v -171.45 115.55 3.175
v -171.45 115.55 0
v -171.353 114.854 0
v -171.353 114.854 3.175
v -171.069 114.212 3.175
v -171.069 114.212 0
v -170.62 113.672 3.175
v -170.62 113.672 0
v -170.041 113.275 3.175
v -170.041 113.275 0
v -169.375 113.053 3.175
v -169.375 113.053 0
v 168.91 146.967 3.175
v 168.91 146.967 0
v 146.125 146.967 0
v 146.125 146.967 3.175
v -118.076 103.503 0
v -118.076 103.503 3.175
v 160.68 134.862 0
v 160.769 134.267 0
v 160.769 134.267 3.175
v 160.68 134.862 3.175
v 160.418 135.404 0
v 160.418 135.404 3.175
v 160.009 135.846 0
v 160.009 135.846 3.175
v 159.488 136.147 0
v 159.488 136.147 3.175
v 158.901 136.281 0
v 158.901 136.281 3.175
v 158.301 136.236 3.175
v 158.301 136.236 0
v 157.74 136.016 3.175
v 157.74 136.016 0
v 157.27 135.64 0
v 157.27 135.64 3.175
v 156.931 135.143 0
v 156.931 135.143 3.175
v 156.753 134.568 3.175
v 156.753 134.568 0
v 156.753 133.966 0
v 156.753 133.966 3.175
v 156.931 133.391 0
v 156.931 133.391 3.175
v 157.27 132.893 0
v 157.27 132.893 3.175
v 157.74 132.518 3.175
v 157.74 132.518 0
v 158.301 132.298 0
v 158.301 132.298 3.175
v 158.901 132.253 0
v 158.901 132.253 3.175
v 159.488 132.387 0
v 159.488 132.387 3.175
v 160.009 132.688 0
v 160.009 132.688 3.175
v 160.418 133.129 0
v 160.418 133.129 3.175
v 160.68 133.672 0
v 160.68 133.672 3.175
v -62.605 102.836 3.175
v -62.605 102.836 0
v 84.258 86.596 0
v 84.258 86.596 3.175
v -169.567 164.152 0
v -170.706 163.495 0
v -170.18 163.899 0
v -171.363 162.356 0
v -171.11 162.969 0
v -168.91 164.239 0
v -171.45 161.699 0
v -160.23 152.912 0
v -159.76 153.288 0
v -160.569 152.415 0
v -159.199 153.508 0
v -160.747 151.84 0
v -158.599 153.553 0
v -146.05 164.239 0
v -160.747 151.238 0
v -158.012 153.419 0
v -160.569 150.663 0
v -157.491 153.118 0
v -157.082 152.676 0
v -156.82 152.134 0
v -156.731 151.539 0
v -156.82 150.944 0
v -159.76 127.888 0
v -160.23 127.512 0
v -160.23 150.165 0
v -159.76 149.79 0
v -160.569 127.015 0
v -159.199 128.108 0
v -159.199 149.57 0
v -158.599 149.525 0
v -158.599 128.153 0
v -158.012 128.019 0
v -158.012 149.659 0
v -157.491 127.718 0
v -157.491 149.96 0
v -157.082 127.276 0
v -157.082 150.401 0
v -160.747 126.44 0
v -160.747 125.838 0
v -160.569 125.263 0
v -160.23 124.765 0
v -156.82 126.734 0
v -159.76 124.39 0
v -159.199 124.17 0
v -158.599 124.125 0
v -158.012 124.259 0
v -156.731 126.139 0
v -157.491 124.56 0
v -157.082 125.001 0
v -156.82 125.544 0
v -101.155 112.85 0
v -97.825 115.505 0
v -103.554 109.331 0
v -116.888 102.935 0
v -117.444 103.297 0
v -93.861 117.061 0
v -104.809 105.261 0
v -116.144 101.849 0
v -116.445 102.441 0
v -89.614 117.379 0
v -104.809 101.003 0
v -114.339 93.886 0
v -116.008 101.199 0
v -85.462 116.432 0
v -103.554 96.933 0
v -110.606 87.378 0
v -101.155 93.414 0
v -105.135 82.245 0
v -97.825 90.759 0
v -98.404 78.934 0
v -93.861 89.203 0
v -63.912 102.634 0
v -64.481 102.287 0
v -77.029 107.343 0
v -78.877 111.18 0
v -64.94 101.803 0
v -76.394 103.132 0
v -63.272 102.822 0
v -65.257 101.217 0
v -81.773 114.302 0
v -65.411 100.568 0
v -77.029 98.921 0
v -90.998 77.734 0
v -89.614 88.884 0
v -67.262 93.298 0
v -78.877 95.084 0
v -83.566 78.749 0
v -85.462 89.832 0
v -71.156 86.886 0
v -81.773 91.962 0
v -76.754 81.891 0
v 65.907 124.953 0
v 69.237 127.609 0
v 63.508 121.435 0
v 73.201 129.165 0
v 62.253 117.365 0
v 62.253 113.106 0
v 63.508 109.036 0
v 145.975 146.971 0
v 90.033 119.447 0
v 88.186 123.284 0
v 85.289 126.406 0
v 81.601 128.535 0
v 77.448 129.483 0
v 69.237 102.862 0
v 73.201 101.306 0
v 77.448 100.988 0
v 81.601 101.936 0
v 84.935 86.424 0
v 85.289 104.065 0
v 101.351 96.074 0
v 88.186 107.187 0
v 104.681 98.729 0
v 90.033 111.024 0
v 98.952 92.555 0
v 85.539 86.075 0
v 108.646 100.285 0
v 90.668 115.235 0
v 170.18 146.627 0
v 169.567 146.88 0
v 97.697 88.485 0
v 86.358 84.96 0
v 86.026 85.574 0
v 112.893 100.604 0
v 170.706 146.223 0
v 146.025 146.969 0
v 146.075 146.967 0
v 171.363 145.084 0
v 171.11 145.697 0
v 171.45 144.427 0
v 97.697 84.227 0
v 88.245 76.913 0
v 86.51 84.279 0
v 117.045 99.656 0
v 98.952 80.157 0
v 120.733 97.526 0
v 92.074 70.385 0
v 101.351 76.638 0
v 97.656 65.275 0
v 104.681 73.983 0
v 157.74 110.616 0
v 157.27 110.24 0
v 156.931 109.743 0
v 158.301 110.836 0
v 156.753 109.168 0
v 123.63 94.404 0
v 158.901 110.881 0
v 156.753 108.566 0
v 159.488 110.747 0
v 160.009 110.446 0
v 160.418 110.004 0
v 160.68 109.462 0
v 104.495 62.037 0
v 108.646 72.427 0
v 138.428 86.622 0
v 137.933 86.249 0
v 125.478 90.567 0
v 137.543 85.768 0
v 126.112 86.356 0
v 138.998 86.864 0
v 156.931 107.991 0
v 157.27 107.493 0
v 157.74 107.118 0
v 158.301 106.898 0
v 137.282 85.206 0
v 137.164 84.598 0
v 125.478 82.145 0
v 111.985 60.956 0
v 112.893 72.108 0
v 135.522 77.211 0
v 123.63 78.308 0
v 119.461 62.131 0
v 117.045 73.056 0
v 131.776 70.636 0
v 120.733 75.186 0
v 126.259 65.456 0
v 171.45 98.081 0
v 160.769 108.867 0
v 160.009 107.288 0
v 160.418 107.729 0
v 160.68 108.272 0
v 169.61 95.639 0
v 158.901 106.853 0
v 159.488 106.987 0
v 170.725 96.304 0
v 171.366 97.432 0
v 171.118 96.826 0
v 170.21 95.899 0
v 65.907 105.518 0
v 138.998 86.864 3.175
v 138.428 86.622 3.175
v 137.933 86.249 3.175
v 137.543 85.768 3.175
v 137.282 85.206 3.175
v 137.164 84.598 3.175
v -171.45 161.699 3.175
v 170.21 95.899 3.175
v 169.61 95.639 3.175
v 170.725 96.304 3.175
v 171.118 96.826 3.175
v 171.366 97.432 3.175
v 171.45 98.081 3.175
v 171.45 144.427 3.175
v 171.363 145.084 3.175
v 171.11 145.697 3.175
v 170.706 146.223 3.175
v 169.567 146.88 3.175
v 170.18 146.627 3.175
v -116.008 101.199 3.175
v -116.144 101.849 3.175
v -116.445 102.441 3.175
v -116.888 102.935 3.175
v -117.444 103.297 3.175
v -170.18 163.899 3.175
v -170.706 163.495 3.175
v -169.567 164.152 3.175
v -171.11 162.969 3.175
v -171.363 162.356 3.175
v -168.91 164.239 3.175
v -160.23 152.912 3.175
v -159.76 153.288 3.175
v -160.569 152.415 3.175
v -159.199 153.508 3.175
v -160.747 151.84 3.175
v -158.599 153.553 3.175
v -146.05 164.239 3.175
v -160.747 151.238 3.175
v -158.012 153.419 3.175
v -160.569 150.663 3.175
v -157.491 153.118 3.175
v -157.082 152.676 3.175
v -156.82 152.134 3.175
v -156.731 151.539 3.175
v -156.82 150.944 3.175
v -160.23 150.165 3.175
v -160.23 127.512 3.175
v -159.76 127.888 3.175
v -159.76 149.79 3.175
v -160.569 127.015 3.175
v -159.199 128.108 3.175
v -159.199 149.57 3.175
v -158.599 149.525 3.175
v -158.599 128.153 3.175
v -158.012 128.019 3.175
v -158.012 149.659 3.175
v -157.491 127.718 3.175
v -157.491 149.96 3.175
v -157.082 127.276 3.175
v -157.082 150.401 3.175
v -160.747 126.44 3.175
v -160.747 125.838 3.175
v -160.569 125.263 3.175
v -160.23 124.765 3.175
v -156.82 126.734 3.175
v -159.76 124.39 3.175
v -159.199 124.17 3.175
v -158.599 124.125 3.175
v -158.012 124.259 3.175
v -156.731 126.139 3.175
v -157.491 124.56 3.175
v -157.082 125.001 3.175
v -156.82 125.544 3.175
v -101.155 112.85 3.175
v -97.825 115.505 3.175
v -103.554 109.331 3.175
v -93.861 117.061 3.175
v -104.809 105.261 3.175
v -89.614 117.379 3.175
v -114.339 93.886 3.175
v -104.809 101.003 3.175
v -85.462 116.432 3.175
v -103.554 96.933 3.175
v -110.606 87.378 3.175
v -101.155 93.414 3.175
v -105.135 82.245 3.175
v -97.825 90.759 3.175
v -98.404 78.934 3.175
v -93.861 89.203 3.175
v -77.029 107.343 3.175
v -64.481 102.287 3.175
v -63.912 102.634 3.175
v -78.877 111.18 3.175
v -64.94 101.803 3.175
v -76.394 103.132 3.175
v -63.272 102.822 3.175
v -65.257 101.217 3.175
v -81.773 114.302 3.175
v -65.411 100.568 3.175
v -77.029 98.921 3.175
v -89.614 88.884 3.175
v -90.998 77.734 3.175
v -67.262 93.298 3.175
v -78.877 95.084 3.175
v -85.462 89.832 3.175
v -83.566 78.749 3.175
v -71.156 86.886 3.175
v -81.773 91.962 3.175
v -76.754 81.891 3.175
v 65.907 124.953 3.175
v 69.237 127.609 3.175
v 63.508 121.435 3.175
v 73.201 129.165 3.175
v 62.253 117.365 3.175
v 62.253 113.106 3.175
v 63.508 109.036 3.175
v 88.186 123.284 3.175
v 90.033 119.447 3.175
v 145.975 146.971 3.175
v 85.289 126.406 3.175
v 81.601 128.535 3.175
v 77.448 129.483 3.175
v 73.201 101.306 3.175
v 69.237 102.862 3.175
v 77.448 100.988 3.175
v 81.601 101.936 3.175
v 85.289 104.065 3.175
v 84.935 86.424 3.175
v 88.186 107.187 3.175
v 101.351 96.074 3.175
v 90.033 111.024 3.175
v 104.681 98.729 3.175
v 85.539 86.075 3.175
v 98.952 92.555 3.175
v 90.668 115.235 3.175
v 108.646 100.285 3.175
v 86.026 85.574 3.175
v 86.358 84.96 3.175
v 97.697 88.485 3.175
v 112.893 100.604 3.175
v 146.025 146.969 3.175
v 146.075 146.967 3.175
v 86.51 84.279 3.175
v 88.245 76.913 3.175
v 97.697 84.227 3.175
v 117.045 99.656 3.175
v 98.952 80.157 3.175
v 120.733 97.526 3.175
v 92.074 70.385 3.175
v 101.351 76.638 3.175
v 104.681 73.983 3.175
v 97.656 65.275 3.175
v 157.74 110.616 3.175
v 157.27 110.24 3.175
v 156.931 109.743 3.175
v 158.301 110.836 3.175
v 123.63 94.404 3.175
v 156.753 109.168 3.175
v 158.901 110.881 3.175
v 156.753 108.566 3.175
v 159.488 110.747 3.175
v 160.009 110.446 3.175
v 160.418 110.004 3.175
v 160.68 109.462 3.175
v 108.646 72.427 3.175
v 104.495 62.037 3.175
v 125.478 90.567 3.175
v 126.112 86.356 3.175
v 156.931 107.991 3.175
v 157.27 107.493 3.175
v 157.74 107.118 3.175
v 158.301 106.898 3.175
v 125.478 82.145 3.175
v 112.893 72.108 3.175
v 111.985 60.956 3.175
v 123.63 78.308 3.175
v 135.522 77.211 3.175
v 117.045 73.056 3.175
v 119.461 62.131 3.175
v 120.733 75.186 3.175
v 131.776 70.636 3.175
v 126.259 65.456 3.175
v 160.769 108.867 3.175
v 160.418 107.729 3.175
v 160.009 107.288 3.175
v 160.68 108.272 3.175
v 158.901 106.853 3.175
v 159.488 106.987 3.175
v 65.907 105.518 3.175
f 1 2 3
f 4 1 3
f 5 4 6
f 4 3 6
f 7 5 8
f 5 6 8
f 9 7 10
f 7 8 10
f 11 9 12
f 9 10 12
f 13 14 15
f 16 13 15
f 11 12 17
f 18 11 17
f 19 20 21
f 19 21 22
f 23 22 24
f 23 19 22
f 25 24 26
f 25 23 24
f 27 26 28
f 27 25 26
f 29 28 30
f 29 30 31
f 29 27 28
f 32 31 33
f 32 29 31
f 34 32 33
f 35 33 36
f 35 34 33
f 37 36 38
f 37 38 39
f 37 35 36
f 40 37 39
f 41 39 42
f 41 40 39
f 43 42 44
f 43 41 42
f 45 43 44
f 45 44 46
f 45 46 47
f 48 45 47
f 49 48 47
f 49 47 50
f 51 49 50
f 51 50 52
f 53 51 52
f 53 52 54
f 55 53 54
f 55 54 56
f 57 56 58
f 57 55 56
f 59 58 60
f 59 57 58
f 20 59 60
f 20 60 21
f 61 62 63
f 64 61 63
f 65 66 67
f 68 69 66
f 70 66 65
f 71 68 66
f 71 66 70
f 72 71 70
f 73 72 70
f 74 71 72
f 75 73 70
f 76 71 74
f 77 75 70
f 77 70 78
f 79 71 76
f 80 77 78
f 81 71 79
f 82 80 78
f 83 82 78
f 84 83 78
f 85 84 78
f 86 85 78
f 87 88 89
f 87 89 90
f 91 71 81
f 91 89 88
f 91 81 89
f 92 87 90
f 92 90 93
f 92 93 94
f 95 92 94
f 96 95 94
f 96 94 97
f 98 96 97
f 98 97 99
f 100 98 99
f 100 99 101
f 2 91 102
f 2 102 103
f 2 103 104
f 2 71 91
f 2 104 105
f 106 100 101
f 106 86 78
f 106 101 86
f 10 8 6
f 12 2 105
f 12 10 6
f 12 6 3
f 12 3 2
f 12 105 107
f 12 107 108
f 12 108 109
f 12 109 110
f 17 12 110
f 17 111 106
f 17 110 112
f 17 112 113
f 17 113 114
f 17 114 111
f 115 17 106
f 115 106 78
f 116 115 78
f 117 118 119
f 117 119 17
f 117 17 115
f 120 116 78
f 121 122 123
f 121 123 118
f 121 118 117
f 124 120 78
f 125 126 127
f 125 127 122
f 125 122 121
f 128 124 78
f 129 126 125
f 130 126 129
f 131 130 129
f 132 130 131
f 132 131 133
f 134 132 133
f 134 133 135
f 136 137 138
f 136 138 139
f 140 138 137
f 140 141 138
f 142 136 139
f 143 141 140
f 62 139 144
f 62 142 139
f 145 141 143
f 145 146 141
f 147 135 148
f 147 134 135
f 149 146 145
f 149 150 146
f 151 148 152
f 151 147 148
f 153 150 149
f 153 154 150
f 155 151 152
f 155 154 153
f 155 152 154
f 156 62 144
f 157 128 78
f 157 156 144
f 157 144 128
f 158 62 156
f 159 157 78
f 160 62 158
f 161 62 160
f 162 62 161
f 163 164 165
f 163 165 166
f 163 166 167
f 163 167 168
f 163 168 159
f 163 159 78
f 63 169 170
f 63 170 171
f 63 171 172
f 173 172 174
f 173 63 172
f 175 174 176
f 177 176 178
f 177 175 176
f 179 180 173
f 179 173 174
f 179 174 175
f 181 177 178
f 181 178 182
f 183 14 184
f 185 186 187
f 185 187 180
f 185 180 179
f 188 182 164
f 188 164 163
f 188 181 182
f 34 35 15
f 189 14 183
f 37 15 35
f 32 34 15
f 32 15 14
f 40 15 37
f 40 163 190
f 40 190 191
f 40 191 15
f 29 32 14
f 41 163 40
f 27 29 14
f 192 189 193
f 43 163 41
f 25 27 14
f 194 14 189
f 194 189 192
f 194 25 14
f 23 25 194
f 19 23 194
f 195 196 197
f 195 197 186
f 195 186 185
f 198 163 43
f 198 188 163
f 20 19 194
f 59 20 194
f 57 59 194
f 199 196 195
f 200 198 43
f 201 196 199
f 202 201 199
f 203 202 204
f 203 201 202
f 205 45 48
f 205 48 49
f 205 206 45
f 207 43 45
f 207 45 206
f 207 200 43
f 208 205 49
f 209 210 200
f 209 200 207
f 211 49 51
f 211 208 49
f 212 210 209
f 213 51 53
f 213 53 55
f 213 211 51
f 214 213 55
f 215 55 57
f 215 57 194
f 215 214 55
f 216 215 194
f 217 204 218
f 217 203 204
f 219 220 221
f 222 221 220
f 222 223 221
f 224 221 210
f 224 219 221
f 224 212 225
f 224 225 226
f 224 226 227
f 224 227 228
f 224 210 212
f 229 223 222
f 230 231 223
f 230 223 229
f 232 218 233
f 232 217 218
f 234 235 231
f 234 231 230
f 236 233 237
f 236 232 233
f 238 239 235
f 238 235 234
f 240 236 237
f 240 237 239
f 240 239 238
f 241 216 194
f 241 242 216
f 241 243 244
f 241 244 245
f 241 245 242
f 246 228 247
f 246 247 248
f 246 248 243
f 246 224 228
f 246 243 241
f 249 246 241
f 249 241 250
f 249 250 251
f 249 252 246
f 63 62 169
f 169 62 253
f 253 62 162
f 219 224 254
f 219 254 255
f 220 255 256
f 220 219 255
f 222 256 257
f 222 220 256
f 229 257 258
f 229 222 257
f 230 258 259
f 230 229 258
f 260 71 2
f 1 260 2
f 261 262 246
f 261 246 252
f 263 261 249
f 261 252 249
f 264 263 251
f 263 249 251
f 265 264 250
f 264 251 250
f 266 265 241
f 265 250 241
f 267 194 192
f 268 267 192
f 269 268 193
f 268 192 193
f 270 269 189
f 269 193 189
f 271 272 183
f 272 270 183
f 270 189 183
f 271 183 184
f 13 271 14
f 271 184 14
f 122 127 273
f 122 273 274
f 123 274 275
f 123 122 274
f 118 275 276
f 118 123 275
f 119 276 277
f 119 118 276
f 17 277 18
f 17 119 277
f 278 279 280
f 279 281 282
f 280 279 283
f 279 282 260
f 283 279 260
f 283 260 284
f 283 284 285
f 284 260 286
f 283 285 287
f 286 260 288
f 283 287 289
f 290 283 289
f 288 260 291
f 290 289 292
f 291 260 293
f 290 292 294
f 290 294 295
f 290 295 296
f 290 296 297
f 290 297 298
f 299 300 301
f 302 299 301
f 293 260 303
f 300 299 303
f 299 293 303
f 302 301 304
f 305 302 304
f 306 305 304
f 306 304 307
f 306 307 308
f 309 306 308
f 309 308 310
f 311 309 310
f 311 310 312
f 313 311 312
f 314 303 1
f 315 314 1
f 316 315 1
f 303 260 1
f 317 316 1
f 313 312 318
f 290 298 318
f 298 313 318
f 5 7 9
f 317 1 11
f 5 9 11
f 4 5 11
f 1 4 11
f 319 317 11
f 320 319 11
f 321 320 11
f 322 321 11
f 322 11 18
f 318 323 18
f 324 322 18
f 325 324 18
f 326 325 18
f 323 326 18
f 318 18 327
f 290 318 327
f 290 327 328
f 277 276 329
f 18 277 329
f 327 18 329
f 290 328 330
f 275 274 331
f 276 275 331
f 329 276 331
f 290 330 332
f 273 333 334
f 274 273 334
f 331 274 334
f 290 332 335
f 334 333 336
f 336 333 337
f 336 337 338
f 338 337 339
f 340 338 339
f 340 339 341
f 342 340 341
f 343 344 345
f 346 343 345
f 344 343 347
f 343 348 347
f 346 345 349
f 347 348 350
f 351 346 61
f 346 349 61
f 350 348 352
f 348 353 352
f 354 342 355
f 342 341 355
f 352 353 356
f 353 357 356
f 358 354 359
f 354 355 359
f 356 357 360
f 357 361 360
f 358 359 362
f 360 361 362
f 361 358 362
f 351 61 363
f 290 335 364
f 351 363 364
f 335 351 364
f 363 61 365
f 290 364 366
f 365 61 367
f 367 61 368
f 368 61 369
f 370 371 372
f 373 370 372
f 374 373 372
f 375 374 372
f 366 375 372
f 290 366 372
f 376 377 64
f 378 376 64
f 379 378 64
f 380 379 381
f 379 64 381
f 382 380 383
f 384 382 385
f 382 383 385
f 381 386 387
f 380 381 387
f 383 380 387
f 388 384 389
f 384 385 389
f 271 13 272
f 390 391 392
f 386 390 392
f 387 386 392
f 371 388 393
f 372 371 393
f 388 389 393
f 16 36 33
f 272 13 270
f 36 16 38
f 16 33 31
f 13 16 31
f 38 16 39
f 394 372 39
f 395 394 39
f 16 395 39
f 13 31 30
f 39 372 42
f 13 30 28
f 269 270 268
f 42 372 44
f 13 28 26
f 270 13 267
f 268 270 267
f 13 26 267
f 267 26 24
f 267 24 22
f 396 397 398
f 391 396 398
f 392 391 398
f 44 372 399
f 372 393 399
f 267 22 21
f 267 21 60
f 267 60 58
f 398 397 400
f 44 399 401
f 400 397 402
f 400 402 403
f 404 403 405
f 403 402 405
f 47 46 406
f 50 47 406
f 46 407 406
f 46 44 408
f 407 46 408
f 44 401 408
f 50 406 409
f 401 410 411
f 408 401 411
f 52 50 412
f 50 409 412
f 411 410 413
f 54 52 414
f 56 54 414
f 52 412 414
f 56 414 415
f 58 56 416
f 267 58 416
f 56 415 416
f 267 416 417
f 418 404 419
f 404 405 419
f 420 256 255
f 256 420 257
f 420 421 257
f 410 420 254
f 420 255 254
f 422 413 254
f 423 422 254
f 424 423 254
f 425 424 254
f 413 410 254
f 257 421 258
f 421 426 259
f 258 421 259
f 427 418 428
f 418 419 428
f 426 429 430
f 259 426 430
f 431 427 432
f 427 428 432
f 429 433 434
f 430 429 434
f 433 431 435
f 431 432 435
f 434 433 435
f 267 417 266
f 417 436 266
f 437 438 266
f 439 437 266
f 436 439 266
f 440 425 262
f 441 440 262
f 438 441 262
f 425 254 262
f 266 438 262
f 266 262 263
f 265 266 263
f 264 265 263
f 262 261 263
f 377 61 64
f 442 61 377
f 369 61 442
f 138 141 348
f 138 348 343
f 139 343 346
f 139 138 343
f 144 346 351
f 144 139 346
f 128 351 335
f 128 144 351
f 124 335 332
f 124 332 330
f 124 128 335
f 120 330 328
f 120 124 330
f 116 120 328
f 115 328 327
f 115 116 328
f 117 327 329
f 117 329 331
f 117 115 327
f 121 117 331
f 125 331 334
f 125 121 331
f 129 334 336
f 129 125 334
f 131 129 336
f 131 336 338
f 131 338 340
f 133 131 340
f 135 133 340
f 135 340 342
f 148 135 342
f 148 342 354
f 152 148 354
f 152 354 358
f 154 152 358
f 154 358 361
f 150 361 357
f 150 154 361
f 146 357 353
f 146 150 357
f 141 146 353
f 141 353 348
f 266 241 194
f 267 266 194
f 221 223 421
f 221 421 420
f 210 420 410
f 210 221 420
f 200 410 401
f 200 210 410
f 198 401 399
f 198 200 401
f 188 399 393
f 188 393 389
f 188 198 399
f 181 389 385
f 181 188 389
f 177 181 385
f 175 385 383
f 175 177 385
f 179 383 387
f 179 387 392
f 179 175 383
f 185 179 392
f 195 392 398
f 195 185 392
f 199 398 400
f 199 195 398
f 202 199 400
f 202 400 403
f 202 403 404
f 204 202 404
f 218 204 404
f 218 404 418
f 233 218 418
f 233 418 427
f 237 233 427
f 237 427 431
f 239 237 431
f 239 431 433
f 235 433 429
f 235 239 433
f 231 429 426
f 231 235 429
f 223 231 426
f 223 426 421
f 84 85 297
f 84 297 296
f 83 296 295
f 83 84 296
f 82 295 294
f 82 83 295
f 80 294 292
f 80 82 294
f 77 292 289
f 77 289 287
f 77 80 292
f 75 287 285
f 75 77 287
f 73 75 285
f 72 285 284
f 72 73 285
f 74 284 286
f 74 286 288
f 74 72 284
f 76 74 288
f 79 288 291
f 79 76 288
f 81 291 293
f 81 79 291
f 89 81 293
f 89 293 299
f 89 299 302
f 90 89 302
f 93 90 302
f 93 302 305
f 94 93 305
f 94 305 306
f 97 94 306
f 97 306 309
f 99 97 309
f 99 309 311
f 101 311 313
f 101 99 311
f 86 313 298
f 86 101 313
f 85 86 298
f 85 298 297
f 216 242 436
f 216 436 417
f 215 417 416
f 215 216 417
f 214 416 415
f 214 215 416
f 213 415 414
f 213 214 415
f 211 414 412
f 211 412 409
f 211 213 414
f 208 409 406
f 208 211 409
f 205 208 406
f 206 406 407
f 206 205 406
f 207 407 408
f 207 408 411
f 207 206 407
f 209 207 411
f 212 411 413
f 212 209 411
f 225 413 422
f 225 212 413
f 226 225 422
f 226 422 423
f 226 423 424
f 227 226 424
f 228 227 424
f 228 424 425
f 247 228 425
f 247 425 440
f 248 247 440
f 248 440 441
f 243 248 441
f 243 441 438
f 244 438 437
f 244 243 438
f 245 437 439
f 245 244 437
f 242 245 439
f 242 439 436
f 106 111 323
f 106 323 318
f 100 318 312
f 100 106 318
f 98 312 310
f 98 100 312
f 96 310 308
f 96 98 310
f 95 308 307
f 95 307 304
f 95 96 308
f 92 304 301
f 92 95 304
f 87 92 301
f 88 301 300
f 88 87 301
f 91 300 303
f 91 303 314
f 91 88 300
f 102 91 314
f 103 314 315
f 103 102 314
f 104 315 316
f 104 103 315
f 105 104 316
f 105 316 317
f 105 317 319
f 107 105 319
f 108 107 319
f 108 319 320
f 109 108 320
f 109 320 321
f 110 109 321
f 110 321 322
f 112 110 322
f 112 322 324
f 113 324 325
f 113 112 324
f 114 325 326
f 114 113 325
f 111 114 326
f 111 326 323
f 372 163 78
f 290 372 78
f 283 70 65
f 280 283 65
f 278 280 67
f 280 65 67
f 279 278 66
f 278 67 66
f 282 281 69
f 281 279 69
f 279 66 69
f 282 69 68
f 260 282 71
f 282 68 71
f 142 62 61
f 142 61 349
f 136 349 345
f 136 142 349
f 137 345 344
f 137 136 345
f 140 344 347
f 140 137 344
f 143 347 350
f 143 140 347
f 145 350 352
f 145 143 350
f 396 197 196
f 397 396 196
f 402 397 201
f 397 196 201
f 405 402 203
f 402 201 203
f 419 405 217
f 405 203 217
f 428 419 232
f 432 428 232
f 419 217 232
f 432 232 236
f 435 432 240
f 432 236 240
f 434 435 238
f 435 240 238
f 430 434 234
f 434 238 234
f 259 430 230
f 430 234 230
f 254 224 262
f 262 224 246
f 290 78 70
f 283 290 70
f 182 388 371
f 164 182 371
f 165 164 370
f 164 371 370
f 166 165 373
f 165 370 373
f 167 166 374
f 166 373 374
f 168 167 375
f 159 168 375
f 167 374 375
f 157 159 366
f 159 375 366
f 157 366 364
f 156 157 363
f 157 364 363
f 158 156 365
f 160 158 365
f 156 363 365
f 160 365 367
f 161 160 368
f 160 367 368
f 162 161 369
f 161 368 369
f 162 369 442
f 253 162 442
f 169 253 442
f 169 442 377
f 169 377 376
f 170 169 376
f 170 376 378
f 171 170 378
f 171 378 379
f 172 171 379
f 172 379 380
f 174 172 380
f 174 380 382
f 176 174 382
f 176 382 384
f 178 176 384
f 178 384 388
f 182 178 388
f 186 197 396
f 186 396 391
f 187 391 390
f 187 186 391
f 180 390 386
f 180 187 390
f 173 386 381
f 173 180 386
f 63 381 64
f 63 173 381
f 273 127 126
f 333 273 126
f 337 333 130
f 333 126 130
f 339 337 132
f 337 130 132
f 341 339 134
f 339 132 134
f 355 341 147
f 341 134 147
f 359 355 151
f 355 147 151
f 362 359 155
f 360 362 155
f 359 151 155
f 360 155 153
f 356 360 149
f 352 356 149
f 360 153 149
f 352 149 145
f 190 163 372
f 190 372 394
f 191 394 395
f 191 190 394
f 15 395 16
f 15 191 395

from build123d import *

# Parameters (mm, degrees)
SKETCH1_R           = 14.2875
SKETCH1_R_2         = 2.0193
BOSS_EXTRUDE1_DEPTH = 3.175
FILLET1_R           = 2.54
SKETCH2_R           = 14.2875
CUT_EXTRUDE1_DEPTH  = 238.443914509


with BuildPart() as part:
    # Sketch1 → Boss-Extrude1 (new body)
    with BuildSketch(Plane.XY):
        with BuildLine():
            Line((-146.05, 164.23894), (-171.45, 164.23894))
            Line((-171.45, 164.23894), (-171.45, 113.43894))
            Line((-171.45, 113.43894), (-116.081416722, 103.131947821))
            ThreePointArc((-116.081416722, 103.131947821), (-90.681416722, 77.731947821), (-65.281416722, 103.131947821))
            Line((-65.281416722, 103.131947821), (86.42489431, 86.355953292))
            ThreePointArc((86.42489431, 86.355953292), (111.82489431, 60.955953292), (137.22489431, 86.355953292))
            Line((137.22489431, 86.355953292), (171.45, 96.16694))
            Line((171.45, 96.16694), (171.45, 146.96694))
            Line((171.45, 146.96694), (146.05, 146.96694))
            Line((146.05, 146.96694), (-146.05, 164.23894))
        make_face()
        with Locations((-90.681416722, 103.131947821)):
            Circle(SKETCH1_R, mode=Mode.SUBTRACT)
        with Locations((111.82489431, 86.355953292)):
            Circle(SKETCH1_R, mode=Mode.SUBTRACT)
        with Locations((-158.75, 151.53894)):
            Circle(SKETCH1_R_2, mode=Mode.SUBTRACT)
        with Locations((158.75, 134.26694)):
            Circle(SKETCH1_R_2, mode=Mode.SUBTRACT)
        with Locations((158.75, 108.86694)):
            Circle(SKETCH1_R_2, mode=Mode.SUBTRACT)
        with Locations((-158.75, 126.13894)):
            Circle(SKETCH1_R_2, mode=Mode.SUBTRACT)
    extrude(amount=BOSS_EXTRUDE1_DEPTH)

    # Fillet1
    # the kernel refuses this fillet: 2.54 mm, written as the material it adds along each edge
    with BuildSketch(Plane(origin=(-65.281416722, 103.131947821, 0), x_dir=(-0.05054020357066893, -0.9987220273044123, 0), z_dir=(0, 0, 1))) as fillet1_piece_1:
        with BuildLine():
            CenterArc((2.695814458, 2.536753949), FILLET1_R, 176.586727967, 90.516297483)
            Line((0.160320257, 2.687979466), (0, 0))
            ThreePointArc((0, 0), (1.283721171, 0.032460506), (2.567442341, 0))
        make_face()
    extrude(amount=3.175)
    with BuildSketch(Plane(origin=(-116.081416722, 103.131947821, 0), x_dir=(-0.983111332758604, 0.1830084899713721, 0), z_dir=(0, 0, 1))) as fillet1_piece_2:
        with BuildLine():
            CenterArc((2.028421781, 2.54), FILLET1_R, 194.908754381, 75.091245619)
            ThreePointArc((-0.42607364, 1.886507669), (-0.195074838, 0.947310604), (0, 0))
            Line((0, 0), (2.028421781, 0))
        make_face()
    extrude(amount=3.175)
    with BuildSketch(Plane(origin=(146.05, 146.96694, 0), x_dir=(1, 0, 0), z_dir=(0, 0, 1))) as fillet1_piece_3:
        with BuildLine():
            CenterArc((FILLET1_R * 0.0295394194537, FILLET1_R), FILLET1_R, 266.616015906, 3.383984094)
            Line((-FILLET1_R * 0.0294879135427, FILLET1_R * 0.00174363314861), (0, 0))
            Line((0, 0), (FILLET1_R * 0.0295394194537, 0))
        make_face()
    extrude(amount=3.175)
    with BuildSketch(Plane(origin=(137.22489431, 86.355953292, 0), x_dir=(0.9612833075503766, 0.275561976014486, 0), z_dir=(0, 0, 1))) as fillet1_piece_4:
        with BuildLine():
            CenterArc((1.844513026, -2.54), FILLET1_R, 90, 70.036589556)
            ThreePointArc((-0.542860523, -1.672793255), (-0.256948075, -0.841096436), (0, 0))
            Line((0, 0), (1.844513026, 0))
        make_face()
    extrude(amount=3.175)
    with BuildSketch(Plane(origin=(86.42489431, 86.355953292, 0), x_dir=(-0.9939413150469867, 0.10991206595577574, 0), z_dir=(0, 0, 1))) as fillet1_piece_5:
        with BuildLine():
            CenterArc((2.180444633, 2.54), FILLET1_R, 191.001176441, 78.998823559)
            ThreePointArc((-0.312878461, 2.055293957), (-0.13540237, 1.03084943), (0, 0))
            Line((0, 0), (2.180444633, 0))
        make_face()
    extrude(amount=3.175)
    # the kernel refuses this fillet: 2.54 mm, written as the material it takes off along each edge
    with BuildSketch(Plane(origin=(-171.45, 113.43894, -5.277017888), x_dir=(0, 1, 0), z_dir=(0, 0, 1))) as fillet1_2_piece_1:
        with BuildLine():
            CenterArc((FILLET1_R * 0.831026439026, -FILLET1_R), FILLET1_R, 90, 79.454954882)
            Line((-FILLET1_R * 0.152084893732, -FILLET1_R * 0.816991510029), (0, 0))
            Line((0, 0), (FILLET1_R * 0.831026439026, 0))
        make_face()
    extrude(amount=13.729035776, mode=Mode.SUBTRACT)
    with BuildSketch(Plane(origin=(-171.45, 164.23894, -6.35), x_dir=(1, 0, 0), z_dir=(0, 0, 1)), Plane(origin=(171.45, 146.96694, -6.35), x_dir=(0, -1, 0), z_dir=(0, 0, 1))) as fillet1_2_piece_2:
        with BuildLine():
            CenterArc((FILLET1_R, -FILLET1_R), FILLET1_R, 90, 90)
            Line((0, -FILLET1_R), (0, 0))
            Line((0, 0), (FILLET1_R, 0))
        make_face()
    extrude(amount=15.875, mode=Mode.SUBTRACT)
    with BuildSketch(Plane(origin=(171.45, 96.16694, -4.78545858), x_dir=(-0.9612833075503753, -0.2755619760144905, 0), z_dir=(0, 0, 1))) as fillet1_2_piece_3:
        with BuildLine():
            CenterArc((FILLET1_R * 0.753615524472, -FILLET1_R), FILLET1_R, 90, 74.004492945)
            Line((-FILLET1_R * 0.207667783079, -FILLET1_R * 0.724438023986), (0, 0))
            Line((0, 0), (FILLET1_R * 0.753615524472, 0))
        make_face()
    extrude(amount=12.745917161, mode=Mode.SUBTRACT)

    # Sketch2 → Cut-Extrude1 (cut, through all)
    with BuildSketch(Plane.XY.offset(3.175)):
        with Locations((76.380709606, 115.23549918)):
            Circle(SKETCH2_R)
    extrude(amount=-CUT_EXTRUDE1_DEPTH, mode=Mode.SUBTRACT)


solid = part.part
